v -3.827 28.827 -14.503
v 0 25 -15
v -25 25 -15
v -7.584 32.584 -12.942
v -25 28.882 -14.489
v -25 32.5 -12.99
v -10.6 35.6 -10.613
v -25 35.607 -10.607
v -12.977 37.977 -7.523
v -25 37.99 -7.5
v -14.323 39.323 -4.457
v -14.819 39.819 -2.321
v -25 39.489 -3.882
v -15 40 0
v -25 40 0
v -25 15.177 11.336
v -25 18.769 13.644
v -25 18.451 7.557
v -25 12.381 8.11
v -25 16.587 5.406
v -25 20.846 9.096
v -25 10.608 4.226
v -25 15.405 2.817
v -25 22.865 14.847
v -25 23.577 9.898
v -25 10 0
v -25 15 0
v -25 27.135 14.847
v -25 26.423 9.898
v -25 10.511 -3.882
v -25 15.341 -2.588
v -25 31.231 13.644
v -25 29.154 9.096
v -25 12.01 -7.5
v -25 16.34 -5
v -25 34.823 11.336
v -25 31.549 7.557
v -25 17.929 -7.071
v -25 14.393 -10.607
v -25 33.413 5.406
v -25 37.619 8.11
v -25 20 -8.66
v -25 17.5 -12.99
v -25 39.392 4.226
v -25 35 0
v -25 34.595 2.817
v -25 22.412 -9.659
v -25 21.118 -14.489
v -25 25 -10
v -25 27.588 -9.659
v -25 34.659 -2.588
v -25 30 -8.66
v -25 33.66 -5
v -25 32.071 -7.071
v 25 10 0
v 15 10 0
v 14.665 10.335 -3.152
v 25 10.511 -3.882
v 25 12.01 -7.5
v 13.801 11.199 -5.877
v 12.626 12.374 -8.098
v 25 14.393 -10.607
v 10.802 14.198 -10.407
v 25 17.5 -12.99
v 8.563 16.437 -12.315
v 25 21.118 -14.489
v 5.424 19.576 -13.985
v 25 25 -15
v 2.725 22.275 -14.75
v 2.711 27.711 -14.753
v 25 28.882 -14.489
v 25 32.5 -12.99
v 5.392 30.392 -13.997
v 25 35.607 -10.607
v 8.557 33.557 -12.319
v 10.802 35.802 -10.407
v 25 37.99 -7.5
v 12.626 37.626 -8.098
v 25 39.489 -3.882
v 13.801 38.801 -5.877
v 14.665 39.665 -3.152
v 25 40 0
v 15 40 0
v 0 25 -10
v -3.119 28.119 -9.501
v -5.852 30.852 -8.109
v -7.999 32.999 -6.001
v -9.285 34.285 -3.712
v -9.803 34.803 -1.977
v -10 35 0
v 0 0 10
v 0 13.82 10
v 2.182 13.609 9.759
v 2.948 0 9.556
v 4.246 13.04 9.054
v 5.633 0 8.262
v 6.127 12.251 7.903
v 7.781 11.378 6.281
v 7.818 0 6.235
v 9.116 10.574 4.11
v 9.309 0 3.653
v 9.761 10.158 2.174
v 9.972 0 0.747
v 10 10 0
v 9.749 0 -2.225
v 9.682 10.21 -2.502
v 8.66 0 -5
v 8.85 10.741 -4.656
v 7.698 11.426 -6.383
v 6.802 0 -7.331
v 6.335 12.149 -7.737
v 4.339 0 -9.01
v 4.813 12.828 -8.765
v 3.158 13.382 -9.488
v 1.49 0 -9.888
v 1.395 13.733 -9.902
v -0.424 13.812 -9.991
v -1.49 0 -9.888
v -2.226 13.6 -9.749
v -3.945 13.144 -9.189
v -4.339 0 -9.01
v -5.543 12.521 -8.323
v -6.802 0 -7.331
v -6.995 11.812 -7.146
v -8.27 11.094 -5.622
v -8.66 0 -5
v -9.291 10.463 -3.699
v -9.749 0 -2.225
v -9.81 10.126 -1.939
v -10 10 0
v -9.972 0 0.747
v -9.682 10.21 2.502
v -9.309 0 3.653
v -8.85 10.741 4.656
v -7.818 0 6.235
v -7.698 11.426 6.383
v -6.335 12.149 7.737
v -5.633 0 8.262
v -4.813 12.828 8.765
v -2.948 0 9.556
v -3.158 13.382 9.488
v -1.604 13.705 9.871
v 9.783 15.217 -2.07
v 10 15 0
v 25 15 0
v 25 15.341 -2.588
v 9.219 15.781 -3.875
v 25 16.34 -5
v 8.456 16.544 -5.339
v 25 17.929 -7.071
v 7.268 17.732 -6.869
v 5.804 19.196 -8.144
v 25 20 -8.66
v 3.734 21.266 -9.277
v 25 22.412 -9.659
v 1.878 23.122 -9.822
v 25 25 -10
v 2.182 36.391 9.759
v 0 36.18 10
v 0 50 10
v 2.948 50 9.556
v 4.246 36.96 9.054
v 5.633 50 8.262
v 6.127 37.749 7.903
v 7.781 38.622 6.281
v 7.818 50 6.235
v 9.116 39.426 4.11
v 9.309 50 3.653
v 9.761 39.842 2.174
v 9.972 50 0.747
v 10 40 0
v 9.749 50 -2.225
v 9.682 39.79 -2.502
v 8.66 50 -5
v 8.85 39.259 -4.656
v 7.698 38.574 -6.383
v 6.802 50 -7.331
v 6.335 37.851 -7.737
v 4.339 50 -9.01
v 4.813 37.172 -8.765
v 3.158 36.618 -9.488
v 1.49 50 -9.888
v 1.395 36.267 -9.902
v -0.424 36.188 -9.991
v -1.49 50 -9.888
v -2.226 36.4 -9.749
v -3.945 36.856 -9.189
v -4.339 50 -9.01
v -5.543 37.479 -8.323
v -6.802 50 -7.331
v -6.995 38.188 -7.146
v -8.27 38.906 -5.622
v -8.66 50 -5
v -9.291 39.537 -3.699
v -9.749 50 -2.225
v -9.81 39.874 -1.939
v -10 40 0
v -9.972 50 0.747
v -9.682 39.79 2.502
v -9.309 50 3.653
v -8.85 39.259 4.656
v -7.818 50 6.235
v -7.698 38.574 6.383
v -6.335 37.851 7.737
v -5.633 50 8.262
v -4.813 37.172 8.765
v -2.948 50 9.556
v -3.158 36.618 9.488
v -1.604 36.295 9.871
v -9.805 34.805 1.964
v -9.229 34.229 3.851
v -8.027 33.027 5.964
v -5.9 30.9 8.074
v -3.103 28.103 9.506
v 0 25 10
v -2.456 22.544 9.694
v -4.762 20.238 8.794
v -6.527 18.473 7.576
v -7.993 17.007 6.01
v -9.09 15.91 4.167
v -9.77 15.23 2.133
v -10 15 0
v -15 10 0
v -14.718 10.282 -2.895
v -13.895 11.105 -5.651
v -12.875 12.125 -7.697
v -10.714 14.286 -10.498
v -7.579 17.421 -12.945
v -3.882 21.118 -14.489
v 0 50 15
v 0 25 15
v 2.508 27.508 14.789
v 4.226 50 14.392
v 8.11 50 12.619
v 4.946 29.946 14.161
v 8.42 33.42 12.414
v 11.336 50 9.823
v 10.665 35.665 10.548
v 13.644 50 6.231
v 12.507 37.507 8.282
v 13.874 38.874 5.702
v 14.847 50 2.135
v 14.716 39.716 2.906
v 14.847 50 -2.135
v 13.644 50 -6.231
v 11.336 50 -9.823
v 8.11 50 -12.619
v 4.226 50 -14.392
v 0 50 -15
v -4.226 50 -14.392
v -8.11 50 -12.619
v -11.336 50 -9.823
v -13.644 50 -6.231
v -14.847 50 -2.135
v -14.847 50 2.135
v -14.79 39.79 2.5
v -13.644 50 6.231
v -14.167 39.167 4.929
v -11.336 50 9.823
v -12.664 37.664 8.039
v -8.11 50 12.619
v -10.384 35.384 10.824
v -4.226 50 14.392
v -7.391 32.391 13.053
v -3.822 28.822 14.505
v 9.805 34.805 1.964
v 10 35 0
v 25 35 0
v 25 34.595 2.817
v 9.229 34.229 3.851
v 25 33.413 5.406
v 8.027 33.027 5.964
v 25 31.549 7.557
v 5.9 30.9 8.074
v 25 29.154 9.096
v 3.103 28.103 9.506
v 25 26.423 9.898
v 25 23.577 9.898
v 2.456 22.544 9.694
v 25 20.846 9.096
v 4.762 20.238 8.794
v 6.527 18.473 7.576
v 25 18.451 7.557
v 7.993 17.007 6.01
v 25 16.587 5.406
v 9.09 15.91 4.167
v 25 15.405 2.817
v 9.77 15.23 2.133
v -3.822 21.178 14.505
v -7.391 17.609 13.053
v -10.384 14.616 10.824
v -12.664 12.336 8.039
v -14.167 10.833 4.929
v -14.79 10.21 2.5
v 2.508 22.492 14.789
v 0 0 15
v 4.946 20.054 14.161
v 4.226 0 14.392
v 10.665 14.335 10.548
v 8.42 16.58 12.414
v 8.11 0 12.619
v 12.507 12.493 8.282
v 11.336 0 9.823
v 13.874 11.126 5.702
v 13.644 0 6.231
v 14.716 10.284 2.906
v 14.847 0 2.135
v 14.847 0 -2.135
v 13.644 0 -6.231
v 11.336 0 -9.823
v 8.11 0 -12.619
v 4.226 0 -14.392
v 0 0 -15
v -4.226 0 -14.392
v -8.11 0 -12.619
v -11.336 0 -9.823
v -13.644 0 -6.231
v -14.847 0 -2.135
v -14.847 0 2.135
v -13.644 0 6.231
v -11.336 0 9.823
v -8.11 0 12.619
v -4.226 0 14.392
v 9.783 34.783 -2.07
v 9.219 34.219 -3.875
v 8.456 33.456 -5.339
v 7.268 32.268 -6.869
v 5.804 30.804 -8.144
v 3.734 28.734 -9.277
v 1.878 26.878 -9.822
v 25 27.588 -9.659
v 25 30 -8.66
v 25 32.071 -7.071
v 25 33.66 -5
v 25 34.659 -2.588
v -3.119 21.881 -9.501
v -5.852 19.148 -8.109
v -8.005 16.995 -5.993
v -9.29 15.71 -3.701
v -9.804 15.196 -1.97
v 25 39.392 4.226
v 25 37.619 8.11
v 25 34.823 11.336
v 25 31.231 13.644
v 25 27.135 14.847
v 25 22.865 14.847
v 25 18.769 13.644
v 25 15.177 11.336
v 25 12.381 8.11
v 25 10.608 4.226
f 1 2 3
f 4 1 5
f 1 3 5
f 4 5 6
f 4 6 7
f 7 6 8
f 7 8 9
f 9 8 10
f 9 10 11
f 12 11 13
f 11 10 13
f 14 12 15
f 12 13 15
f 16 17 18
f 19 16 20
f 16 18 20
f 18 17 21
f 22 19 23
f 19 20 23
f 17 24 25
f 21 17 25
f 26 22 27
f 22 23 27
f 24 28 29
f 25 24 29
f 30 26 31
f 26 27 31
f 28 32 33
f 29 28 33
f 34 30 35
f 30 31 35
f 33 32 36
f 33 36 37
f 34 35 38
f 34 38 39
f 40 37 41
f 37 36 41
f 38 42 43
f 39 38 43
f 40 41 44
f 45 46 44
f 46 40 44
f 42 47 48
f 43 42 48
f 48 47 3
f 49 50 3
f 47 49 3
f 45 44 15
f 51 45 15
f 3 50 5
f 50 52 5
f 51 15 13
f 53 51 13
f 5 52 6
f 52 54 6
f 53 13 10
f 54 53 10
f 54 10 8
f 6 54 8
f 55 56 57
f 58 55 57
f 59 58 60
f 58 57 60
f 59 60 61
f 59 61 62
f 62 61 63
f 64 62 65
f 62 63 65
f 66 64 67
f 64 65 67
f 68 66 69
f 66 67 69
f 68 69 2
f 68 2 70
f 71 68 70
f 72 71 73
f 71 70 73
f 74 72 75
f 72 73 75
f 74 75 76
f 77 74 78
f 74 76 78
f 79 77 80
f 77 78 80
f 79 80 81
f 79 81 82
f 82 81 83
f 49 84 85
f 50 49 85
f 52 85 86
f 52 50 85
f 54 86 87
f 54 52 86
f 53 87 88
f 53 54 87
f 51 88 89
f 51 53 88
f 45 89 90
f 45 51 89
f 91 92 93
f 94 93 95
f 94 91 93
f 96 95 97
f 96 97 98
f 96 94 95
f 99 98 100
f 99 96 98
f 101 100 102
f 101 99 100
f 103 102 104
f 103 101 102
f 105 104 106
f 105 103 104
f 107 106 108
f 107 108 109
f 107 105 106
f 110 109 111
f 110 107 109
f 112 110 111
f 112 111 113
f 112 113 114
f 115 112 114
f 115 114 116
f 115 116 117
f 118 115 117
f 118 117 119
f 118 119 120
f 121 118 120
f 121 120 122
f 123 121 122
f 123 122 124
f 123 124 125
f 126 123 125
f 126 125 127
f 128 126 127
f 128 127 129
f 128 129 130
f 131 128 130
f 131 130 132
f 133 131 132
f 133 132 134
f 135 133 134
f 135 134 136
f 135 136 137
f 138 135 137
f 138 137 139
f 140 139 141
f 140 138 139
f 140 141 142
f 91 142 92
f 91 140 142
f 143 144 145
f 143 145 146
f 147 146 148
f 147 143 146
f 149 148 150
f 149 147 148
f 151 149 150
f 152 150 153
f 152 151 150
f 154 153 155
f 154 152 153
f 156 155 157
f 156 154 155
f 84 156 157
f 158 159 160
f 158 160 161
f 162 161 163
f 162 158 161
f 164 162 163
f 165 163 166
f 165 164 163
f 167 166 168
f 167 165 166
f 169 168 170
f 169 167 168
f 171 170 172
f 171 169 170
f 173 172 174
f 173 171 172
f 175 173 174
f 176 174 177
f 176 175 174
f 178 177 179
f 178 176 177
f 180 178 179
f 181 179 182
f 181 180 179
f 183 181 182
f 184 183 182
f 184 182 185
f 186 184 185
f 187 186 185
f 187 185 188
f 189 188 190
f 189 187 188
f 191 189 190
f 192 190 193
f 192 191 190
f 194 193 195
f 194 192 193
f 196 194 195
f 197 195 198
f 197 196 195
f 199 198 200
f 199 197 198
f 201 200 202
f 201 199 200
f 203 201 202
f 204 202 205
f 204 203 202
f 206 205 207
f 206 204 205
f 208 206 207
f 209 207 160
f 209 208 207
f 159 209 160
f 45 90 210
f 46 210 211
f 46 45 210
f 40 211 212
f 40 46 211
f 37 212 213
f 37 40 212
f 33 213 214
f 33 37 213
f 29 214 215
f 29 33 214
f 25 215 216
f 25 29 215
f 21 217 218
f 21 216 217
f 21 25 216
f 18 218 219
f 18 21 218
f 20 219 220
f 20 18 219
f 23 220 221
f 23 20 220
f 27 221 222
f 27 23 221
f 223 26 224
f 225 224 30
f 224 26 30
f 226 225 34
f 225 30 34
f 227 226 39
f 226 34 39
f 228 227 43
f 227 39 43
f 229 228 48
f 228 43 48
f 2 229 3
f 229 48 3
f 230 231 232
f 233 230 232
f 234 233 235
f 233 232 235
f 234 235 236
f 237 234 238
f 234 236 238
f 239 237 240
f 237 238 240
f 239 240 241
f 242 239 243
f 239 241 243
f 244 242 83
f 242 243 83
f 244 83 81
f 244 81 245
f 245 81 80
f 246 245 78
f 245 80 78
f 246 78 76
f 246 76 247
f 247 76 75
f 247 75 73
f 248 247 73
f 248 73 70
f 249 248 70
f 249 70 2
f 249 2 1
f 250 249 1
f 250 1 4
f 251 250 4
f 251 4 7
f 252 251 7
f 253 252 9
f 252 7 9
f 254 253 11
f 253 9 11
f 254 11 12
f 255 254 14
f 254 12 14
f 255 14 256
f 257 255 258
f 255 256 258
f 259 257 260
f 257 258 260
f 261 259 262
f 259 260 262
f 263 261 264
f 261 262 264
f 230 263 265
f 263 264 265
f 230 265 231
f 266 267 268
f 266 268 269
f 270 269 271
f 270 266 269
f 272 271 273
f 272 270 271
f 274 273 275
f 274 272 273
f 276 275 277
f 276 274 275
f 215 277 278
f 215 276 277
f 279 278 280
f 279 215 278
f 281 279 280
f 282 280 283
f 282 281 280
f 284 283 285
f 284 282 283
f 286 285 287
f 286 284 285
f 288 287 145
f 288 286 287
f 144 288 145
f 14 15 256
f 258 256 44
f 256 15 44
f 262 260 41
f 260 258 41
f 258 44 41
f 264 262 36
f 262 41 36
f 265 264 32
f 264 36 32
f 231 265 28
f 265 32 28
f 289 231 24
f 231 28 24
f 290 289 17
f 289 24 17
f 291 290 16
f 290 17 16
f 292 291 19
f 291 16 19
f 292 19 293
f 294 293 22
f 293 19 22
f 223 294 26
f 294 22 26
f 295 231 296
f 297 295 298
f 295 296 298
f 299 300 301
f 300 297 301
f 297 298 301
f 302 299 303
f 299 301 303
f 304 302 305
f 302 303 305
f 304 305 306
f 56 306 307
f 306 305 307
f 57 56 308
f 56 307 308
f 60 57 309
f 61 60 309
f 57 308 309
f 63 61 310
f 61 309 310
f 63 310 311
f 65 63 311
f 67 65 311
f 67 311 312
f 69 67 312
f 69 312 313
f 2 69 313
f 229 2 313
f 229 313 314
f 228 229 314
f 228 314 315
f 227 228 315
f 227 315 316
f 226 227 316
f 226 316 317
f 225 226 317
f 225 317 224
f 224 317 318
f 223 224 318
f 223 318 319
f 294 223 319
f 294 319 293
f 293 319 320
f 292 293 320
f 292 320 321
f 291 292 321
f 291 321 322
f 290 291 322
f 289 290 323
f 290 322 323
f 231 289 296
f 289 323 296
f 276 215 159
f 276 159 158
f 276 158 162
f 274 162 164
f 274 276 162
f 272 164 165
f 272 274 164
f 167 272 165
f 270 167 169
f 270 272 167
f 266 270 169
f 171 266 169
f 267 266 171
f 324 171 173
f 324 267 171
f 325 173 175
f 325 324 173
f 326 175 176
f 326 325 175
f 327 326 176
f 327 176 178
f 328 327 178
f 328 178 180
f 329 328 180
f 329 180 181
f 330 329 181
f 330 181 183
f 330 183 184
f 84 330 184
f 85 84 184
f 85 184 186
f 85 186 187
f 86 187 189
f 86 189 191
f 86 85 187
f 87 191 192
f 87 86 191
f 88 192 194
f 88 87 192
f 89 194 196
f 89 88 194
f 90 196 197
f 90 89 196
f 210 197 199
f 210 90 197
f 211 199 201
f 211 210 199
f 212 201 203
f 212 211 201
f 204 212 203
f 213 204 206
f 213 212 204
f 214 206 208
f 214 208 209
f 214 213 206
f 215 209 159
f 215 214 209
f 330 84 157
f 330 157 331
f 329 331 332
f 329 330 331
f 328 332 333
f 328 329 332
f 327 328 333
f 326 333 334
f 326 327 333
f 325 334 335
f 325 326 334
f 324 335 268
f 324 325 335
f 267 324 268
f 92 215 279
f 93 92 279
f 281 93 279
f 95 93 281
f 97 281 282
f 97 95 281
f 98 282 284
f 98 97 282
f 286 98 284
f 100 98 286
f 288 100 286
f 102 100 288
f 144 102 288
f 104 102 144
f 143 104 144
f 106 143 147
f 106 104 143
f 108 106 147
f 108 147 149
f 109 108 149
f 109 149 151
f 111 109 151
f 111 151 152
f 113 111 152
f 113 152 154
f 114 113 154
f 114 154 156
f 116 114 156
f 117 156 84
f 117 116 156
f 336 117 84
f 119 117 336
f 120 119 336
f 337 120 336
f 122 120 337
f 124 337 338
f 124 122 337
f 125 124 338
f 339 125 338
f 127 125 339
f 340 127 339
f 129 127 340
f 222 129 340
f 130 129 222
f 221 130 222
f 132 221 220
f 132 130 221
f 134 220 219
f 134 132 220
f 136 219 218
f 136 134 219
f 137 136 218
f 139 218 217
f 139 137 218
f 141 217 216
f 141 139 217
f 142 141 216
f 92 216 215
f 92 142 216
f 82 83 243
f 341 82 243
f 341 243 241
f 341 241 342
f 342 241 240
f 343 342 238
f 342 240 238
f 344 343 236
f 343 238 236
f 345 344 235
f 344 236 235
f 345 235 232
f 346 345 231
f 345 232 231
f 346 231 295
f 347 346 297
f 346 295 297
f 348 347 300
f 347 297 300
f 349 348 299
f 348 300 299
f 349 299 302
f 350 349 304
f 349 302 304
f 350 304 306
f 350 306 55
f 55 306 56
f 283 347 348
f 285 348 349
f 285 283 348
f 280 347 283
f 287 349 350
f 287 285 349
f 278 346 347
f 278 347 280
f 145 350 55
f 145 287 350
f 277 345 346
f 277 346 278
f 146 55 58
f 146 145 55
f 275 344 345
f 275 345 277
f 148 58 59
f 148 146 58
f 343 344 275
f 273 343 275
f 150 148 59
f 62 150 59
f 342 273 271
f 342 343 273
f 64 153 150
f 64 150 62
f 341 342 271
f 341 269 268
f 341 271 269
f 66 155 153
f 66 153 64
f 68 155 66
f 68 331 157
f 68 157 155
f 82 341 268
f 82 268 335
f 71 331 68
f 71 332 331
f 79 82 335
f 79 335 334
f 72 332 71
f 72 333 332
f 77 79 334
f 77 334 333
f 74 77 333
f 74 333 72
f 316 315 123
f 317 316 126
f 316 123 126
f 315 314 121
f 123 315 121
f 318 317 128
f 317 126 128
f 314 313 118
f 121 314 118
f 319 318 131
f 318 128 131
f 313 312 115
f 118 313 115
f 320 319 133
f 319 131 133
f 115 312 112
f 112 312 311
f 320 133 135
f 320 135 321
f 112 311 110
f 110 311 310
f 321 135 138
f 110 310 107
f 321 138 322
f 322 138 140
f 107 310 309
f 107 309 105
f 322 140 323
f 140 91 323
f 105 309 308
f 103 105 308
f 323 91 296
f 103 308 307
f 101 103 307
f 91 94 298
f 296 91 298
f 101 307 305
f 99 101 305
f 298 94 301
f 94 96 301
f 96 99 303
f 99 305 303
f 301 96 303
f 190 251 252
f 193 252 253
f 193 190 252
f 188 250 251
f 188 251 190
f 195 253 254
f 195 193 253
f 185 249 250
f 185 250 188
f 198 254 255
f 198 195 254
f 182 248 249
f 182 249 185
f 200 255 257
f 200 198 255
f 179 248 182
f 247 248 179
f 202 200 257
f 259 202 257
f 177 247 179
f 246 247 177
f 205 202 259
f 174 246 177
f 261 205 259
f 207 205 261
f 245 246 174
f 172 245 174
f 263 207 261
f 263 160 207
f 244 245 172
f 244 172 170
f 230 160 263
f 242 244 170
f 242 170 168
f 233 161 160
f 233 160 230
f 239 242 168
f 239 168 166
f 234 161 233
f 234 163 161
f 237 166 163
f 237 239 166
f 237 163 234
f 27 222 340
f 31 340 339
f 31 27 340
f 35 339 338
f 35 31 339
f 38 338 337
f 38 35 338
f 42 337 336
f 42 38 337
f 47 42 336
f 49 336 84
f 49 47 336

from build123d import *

# Parameters (mm, degrees)
SKETCH_1_R               = 15
SKETCH_1_R_2             = 10
EXTRUDE_1_DEPTH          = 50
EXTRUDE_6_DEPTH          = 25
EXTRUDE_6_DEPTH_BACK     = 25
SKETCH_9_R               = 15
CUT_EXTRUDE_2_DEPTH      = 25
CUT_EXTRUDE_2_DEPTH_BACK = 25
SKETCH_10_R              = 10
CUT_EXTRUDE_3_DEPTH      = 58.8791846
CUT_EXTRUDE_3_DEPTH_BACK = 58.8791846
SKETCH_11_R              = 10


with BuildPart() as part:
    # 草图1 → 凸台-拉伸1 (new body)
    with BuildSketch(Plane(origin=(0, 0, 0), x_dir=(1, 0, 0), z_dir=(0, 1, 0))):
        Circle(SKETCH_1_R)
        Circle(SKETCH_1_R_2, mode=Mode.SUBTRACT)
    extrude(amount=EXTRUDE_1_DEPTH)

    # 草图9 → 凸台-拉伸6 (add, two sides: drawn at the far end of the back side and taken through both)
    with BuildSketch(Plane(origin=(0, 0, 0), x_dir=(0, 0, -1), z_dir=(1, 0, 0)).offset(-EXTRUDE_6_DEPTH_BACK)):
        with Locations((0, 25)):
            Circle(SKETCH_9_R)
    extrude(amount=EXTRUDE_6_DEPTH + EXTRUDE_6_DEPTH_BACK)

    # 草图10 → 切除-拉伸2 (cut, two sides: drawn at the far end of the back side and taken through both)
    with BuildSketch(Plane(origin=(0, 0, 0), x_dir=(0, 0, -1), z_dir=(1, 0, 0)).offset(-CUT_EXTRUDE_2_DEPTH_BACK)):
        with Locations((0, 25)):
            Circle(SKETCH_10_R)
    extrude(amount=CUT_EXTRUDE_2_DEPTH + CUT_EXTRUDE_2_DEPTH_BACK, mode=Mode.SUBTRACT)

    # 草图11 → 切除-拉伸3 (cut, two sides: drawn at the far end of the back side and taken through both)
    with BuildSketch(Plane(origin=(0, 0, 0), x_dir=(1, 0, 0), z_dir=(0, 1, 0)).offset(-CUT_EXTRUDE_3_DEPTH_BACK)):
        Circle(SKETCH_11_R)
    extrude(amount=CUT_EXTRUDE_3_DEPTH + CUT_EXTRUDE_3_DEPTH_BACK, mode=Mode.SUBTRACT)


solid = part.part
